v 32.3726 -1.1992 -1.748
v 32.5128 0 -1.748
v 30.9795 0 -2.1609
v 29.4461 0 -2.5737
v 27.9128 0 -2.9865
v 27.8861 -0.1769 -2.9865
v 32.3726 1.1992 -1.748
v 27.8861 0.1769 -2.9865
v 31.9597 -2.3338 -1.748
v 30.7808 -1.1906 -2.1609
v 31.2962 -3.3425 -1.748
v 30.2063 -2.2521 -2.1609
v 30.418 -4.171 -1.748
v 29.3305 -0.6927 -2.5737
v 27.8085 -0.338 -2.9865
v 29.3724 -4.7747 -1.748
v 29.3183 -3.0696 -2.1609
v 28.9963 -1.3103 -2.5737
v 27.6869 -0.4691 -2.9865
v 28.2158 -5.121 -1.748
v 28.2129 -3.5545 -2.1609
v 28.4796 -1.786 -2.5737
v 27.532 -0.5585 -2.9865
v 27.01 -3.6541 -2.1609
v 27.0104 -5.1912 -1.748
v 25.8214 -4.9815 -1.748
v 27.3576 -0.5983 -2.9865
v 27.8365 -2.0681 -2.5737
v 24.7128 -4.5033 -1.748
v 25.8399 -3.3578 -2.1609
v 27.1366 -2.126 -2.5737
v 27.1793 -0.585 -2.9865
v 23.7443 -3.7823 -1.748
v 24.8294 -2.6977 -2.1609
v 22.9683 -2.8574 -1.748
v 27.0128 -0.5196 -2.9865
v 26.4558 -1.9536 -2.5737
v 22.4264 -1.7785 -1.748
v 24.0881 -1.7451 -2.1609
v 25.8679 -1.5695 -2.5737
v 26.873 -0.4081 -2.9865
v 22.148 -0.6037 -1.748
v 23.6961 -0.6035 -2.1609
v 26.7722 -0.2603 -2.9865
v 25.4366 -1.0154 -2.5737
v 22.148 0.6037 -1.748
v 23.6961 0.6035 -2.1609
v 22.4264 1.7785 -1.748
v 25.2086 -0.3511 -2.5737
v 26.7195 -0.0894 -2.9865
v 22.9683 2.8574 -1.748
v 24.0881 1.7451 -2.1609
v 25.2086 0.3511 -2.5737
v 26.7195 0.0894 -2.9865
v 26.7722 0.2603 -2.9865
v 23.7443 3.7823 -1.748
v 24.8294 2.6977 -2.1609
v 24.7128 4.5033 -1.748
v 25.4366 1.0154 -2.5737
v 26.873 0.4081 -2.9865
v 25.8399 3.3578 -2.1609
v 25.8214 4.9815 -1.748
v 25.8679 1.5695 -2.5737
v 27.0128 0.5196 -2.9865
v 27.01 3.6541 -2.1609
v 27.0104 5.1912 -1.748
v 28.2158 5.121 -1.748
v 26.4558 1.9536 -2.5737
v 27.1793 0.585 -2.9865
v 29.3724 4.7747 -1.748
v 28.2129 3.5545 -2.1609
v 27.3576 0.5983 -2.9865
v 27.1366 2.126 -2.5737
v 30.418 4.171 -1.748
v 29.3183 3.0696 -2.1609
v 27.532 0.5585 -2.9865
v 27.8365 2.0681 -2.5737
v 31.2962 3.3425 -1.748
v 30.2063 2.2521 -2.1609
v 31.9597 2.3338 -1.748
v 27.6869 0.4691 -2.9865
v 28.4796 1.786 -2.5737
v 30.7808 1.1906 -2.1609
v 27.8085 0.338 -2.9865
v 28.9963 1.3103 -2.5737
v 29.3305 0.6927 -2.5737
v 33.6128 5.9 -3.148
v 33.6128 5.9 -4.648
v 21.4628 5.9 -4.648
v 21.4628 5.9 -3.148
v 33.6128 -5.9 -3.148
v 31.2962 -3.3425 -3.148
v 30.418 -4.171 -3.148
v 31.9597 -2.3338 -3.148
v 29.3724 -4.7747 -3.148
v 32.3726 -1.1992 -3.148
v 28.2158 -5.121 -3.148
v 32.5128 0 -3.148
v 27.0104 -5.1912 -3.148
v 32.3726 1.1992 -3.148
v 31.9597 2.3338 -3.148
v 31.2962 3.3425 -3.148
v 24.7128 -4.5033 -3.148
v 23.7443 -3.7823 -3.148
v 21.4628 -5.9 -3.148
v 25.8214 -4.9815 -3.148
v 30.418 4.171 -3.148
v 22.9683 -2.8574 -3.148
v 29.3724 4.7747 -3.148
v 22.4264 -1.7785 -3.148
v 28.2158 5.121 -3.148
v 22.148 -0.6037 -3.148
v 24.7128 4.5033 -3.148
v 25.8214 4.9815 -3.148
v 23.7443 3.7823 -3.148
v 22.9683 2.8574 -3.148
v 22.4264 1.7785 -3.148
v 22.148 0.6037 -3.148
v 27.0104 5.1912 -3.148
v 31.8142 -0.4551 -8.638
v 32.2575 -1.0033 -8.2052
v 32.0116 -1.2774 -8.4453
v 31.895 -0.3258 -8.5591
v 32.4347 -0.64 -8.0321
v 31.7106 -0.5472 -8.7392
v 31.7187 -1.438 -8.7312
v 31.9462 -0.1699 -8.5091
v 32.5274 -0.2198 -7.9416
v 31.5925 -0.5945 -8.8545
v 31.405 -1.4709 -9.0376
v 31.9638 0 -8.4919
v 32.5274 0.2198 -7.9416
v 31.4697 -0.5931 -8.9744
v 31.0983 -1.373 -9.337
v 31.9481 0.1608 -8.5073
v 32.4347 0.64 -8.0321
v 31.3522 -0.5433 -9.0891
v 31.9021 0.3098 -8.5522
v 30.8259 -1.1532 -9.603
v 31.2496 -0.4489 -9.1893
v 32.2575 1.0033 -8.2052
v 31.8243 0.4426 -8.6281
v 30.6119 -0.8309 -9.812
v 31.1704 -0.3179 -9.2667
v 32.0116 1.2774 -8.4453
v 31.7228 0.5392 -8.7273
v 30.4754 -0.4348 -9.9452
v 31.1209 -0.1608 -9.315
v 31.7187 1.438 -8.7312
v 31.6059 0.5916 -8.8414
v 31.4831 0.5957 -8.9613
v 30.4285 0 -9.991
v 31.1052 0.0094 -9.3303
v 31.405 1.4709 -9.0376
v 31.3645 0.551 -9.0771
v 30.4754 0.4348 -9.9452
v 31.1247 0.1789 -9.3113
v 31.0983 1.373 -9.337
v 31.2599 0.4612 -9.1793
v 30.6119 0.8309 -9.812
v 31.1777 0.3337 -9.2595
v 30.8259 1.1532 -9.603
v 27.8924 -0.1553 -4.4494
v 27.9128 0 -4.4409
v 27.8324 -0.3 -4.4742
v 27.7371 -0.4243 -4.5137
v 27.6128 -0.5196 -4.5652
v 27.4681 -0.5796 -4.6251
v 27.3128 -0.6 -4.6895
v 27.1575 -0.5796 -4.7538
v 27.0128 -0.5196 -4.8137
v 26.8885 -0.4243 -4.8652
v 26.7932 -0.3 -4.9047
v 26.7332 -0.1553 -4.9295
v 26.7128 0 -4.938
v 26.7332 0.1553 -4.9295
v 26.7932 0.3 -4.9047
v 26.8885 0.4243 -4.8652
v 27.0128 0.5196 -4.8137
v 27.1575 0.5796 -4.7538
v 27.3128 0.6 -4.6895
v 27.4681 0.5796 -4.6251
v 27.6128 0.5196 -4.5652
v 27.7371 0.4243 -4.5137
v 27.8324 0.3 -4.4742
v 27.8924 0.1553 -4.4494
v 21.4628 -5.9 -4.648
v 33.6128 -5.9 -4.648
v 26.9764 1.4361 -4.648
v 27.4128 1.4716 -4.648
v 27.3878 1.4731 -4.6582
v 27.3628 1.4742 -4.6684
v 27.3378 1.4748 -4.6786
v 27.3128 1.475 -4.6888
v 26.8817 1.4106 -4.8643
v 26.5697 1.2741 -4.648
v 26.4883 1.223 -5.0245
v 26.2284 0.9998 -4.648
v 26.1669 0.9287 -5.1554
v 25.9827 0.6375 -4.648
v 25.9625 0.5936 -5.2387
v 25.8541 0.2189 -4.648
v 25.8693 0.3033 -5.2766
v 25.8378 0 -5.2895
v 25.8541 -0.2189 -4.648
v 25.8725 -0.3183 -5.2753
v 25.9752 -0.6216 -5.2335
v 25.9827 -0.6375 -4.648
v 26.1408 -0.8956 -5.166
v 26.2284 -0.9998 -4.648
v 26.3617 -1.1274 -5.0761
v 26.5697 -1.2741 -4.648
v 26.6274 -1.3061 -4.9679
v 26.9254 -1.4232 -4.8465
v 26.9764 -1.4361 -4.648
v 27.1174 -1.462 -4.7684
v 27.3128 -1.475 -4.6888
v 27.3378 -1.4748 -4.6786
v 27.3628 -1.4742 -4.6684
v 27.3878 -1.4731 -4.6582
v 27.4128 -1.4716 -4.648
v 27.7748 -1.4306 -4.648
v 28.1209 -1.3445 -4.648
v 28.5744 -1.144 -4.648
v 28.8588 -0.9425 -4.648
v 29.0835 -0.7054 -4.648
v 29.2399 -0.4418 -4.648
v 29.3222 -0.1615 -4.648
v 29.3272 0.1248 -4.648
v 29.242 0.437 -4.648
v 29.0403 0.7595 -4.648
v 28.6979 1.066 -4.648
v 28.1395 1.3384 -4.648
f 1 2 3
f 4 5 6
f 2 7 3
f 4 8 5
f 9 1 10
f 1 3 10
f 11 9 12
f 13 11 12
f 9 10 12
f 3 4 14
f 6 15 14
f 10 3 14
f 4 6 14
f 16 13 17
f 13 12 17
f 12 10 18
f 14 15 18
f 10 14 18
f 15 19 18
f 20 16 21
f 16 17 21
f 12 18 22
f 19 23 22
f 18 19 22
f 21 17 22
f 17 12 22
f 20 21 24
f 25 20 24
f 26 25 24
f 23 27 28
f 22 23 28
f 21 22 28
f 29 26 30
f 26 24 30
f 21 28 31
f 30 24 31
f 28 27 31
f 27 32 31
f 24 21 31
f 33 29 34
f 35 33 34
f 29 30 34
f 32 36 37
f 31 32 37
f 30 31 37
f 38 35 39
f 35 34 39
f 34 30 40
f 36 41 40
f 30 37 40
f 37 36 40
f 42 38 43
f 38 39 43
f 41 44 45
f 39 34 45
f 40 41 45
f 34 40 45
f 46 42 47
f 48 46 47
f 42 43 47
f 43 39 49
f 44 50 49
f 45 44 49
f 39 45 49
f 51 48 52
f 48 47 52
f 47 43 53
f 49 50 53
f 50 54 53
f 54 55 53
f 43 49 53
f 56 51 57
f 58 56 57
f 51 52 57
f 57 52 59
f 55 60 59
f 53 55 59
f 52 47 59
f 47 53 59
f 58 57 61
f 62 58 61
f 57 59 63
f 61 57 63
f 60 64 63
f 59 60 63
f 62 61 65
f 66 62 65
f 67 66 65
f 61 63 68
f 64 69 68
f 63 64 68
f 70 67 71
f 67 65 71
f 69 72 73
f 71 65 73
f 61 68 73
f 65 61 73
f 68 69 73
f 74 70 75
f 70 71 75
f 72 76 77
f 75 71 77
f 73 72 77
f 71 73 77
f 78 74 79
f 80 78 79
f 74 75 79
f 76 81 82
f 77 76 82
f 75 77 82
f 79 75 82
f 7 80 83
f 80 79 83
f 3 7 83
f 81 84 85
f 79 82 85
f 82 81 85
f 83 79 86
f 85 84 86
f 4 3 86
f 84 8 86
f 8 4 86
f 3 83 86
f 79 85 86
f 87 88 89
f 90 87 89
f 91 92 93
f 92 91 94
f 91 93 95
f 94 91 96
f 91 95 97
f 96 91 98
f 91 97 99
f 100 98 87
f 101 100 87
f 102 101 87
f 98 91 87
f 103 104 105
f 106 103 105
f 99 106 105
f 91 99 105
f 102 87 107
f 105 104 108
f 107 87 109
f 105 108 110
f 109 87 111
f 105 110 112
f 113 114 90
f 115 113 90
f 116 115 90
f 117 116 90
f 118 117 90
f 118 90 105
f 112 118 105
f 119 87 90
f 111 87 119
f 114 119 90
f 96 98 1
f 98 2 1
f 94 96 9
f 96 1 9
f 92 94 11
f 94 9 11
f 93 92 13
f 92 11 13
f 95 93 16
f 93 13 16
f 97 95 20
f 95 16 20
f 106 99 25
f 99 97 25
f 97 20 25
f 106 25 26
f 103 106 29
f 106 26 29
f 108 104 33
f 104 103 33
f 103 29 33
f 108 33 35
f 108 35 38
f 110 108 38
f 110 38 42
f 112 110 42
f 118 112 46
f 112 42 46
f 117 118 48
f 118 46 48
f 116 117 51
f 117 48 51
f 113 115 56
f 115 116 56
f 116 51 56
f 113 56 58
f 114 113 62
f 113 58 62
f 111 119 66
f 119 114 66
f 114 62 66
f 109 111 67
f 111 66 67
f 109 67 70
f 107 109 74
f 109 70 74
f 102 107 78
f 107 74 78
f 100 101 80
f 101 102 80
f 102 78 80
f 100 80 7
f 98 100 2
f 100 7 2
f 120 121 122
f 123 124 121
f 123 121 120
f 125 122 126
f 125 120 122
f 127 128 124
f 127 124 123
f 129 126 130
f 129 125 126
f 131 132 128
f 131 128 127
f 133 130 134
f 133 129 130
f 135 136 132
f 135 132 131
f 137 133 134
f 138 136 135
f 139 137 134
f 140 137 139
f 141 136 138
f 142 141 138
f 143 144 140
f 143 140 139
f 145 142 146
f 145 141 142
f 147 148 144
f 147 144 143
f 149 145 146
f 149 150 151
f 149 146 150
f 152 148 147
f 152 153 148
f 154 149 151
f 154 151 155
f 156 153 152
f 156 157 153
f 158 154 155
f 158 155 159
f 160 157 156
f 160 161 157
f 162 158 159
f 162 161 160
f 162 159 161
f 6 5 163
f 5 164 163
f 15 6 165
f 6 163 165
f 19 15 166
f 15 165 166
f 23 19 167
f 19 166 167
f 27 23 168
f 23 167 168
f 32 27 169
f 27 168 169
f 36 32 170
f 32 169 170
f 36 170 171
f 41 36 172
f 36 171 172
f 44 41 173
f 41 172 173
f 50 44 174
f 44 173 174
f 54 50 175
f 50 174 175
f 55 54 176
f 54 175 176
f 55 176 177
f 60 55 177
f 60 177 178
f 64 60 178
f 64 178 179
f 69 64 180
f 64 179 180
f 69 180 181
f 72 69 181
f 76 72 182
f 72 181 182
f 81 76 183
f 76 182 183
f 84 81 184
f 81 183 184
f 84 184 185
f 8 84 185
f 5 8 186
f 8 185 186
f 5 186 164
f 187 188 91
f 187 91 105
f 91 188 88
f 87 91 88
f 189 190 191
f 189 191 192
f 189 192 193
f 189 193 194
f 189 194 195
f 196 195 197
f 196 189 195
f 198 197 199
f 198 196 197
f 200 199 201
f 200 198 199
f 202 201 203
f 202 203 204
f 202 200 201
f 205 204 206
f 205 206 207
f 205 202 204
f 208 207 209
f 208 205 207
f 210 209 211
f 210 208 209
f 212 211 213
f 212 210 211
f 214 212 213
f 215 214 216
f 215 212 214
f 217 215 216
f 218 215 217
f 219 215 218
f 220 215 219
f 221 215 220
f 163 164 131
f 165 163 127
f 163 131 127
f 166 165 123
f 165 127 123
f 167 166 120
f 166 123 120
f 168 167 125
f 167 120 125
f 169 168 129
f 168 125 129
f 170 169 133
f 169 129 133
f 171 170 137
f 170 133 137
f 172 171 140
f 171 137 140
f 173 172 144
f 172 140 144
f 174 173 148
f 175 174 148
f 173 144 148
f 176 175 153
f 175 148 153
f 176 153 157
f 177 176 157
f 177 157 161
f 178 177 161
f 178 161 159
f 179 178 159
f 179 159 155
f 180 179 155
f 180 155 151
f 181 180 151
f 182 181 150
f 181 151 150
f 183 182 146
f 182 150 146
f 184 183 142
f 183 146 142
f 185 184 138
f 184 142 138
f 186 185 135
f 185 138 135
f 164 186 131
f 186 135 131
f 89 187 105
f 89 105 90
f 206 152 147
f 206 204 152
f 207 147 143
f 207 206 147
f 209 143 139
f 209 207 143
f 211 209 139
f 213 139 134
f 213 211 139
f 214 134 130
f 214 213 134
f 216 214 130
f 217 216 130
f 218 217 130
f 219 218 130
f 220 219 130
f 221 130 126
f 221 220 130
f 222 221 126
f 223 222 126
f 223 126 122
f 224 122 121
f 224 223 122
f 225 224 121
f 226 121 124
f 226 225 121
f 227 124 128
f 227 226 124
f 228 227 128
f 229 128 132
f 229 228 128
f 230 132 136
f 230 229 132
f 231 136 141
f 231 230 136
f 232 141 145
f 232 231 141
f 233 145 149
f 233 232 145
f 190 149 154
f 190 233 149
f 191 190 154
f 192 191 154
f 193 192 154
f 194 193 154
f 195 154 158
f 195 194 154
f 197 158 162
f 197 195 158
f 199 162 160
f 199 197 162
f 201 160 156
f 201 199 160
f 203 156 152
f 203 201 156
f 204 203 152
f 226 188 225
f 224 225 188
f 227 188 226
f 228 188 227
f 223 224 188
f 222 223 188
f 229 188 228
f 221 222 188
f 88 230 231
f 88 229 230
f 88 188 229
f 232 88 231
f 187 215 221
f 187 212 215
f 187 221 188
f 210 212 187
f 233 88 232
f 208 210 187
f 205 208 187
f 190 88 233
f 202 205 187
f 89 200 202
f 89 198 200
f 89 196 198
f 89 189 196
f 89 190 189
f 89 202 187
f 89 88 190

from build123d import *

# Parameters (mm, degrees)
SKETCH7_R           = 1.475
SKETCH10_W          = 12.15
SKETCH10_H          = 11.8
BOSS_EXTRUDE1_DEPTH = 1.5
SKETCH5_R           = 0.6


with BuildPart() as part:
    # Sketch1 → Revolve1 (revolve)
    with BuildSketch(Plane(origin=(0, 0, 0), x_dir=(1, 0, 0), z_dir=(0, 1, 0))):
        Polygon((27.31279509, 4.648041847), (32.51279509, 4.648041847), (32.51279509, 1.748041847), (27.31279509, 3.148041847), align=None)
    revolve(axis=Axis((27.31279509, 0, -3.148041847), (0, 0, -1)))

    # Sweep2: sweep along a path in Sketch8
    with BuildLine(Plane(origin=(0, 0, 0), x_dir=(1, 0, 0), z_dir=(0, 1, 0))) as sweep2_path:
        Line((31.555435777, 8.890682534), (27.41279509, 4.648041847))
        Line((27.41279509, 4.648041847), (27.41279509, 3.648041847))
    # Sketch7 → Sweep2 (sweep)
    with BuildSketch(Plane(origin=(0, 0, -4.648041847), x_dir=(-1, 0, 0), z_dir=(0, 0, -1))):
        with Locations((-27.31279509, 0)):
            Circle(SKETCH7_R)
    sweep(path=sweep2_path.line, transition=Transition.RIGHT)

    # Sketch10 → Boss-Extrude1 (add)
    with BuildSketch(Plane(origin=(0, 0, -4.648041847), x_dir=(-1, 0, 0), z_dir=(0, 0, -1))):
        with Locations((-27.53779509, 0)):
            Rectangle(SKETCH10_W, SKETCH10_H)
    extrude(amount=-BOSS_EXTRUDE1_DEPTH)

    # Cut-Sweep2: sweep along a path in Sketch9
    with BuildLine(Plane(origin=(0, 0, 0), x_dir=(1, 0, 0), z_dir=(0, 1, 0))) as cut_sweep2_path:
        Line((27.41279509, 0), (27.41279509, 4.648041847))
        Line((27.41279509, 4.648041847), (31.655435777, 8.890682534))
    # Sketch5 → Cut-Sweep2 (sweep, cut)
    with BuildSketch(Plane.XY):
        with Locations((27.31279509, 0)):
            Circle(SKETCH5_R)
    sweep(path=cut_sweep2_path.line, transition=Transition.RIGHT, mode=Mode.SUBTRACT)


solid = part.part
